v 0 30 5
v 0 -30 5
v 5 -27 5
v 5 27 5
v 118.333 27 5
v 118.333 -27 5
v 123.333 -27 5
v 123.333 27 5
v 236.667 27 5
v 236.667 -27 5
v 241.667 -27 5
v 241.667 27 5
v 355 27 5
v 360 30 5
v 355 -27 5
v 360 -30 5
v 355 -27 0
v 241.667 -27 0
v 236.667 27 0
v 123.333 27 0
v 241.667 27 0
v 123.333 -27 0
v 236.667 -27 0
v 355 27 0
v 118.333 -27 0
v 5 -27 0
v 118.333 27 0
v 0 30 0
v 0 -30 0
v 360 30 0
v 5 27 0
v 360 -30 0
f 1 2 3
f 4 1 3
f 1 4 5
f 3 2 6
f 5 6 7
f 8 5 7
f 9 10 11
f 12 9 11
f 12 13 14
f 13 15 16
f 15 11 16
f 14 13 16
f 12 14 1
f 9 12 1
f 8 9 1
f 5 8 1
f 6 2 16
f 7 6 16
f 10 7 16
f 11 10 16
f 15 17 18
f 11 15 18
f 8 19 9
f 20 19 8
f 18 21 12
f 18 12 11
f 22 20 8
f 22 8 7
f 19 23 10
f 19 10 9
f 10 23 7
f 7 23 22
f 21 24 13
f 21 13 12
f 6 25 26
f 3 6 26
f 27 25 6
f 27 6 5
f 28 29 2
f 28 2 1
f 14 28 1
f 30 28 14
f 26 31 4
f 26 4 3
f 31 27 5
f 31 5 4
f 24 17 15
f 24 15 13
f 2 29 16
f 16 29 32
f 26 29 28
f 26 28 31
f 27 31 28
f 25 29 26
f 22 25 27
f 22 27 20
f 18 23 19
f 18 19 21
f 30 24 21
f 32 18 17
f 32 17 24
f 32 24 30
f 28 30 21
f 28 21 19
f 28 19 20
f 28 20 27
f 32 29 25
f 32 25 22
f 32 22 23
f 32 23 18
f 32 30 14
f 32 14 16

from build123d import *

# Parameters (mm, degrees)
F1_DEPTH = 5


with BuildPart() as f1:
    # F0 (on Top) → F1 (new body)
    with BuildSketch(Plane.XY):
        Polygon((5, 0), (0, 0), (0, -30), (360, -30), (360, 0), (355, 0), (355, -27), (241.666667, -27), (241.666667, 0), (236.666667, 0), (236.666667, -27), (123.333333, -27), (123.333333, 0), (118.333333, 0), (118.333333, -27), (5, -27), align=None)
    extrude(amount=F1_DEPTH)

    # F2: F1 across face


with BuildPart() as f1_1:
    add(f1.part)
    add(f1.part.mirror(Plane(origin=(2.5, 0, 2.5), x_dir=(-1, 0, 0), z_dir=(0, 1, 0))))


solid = f1_1.part
